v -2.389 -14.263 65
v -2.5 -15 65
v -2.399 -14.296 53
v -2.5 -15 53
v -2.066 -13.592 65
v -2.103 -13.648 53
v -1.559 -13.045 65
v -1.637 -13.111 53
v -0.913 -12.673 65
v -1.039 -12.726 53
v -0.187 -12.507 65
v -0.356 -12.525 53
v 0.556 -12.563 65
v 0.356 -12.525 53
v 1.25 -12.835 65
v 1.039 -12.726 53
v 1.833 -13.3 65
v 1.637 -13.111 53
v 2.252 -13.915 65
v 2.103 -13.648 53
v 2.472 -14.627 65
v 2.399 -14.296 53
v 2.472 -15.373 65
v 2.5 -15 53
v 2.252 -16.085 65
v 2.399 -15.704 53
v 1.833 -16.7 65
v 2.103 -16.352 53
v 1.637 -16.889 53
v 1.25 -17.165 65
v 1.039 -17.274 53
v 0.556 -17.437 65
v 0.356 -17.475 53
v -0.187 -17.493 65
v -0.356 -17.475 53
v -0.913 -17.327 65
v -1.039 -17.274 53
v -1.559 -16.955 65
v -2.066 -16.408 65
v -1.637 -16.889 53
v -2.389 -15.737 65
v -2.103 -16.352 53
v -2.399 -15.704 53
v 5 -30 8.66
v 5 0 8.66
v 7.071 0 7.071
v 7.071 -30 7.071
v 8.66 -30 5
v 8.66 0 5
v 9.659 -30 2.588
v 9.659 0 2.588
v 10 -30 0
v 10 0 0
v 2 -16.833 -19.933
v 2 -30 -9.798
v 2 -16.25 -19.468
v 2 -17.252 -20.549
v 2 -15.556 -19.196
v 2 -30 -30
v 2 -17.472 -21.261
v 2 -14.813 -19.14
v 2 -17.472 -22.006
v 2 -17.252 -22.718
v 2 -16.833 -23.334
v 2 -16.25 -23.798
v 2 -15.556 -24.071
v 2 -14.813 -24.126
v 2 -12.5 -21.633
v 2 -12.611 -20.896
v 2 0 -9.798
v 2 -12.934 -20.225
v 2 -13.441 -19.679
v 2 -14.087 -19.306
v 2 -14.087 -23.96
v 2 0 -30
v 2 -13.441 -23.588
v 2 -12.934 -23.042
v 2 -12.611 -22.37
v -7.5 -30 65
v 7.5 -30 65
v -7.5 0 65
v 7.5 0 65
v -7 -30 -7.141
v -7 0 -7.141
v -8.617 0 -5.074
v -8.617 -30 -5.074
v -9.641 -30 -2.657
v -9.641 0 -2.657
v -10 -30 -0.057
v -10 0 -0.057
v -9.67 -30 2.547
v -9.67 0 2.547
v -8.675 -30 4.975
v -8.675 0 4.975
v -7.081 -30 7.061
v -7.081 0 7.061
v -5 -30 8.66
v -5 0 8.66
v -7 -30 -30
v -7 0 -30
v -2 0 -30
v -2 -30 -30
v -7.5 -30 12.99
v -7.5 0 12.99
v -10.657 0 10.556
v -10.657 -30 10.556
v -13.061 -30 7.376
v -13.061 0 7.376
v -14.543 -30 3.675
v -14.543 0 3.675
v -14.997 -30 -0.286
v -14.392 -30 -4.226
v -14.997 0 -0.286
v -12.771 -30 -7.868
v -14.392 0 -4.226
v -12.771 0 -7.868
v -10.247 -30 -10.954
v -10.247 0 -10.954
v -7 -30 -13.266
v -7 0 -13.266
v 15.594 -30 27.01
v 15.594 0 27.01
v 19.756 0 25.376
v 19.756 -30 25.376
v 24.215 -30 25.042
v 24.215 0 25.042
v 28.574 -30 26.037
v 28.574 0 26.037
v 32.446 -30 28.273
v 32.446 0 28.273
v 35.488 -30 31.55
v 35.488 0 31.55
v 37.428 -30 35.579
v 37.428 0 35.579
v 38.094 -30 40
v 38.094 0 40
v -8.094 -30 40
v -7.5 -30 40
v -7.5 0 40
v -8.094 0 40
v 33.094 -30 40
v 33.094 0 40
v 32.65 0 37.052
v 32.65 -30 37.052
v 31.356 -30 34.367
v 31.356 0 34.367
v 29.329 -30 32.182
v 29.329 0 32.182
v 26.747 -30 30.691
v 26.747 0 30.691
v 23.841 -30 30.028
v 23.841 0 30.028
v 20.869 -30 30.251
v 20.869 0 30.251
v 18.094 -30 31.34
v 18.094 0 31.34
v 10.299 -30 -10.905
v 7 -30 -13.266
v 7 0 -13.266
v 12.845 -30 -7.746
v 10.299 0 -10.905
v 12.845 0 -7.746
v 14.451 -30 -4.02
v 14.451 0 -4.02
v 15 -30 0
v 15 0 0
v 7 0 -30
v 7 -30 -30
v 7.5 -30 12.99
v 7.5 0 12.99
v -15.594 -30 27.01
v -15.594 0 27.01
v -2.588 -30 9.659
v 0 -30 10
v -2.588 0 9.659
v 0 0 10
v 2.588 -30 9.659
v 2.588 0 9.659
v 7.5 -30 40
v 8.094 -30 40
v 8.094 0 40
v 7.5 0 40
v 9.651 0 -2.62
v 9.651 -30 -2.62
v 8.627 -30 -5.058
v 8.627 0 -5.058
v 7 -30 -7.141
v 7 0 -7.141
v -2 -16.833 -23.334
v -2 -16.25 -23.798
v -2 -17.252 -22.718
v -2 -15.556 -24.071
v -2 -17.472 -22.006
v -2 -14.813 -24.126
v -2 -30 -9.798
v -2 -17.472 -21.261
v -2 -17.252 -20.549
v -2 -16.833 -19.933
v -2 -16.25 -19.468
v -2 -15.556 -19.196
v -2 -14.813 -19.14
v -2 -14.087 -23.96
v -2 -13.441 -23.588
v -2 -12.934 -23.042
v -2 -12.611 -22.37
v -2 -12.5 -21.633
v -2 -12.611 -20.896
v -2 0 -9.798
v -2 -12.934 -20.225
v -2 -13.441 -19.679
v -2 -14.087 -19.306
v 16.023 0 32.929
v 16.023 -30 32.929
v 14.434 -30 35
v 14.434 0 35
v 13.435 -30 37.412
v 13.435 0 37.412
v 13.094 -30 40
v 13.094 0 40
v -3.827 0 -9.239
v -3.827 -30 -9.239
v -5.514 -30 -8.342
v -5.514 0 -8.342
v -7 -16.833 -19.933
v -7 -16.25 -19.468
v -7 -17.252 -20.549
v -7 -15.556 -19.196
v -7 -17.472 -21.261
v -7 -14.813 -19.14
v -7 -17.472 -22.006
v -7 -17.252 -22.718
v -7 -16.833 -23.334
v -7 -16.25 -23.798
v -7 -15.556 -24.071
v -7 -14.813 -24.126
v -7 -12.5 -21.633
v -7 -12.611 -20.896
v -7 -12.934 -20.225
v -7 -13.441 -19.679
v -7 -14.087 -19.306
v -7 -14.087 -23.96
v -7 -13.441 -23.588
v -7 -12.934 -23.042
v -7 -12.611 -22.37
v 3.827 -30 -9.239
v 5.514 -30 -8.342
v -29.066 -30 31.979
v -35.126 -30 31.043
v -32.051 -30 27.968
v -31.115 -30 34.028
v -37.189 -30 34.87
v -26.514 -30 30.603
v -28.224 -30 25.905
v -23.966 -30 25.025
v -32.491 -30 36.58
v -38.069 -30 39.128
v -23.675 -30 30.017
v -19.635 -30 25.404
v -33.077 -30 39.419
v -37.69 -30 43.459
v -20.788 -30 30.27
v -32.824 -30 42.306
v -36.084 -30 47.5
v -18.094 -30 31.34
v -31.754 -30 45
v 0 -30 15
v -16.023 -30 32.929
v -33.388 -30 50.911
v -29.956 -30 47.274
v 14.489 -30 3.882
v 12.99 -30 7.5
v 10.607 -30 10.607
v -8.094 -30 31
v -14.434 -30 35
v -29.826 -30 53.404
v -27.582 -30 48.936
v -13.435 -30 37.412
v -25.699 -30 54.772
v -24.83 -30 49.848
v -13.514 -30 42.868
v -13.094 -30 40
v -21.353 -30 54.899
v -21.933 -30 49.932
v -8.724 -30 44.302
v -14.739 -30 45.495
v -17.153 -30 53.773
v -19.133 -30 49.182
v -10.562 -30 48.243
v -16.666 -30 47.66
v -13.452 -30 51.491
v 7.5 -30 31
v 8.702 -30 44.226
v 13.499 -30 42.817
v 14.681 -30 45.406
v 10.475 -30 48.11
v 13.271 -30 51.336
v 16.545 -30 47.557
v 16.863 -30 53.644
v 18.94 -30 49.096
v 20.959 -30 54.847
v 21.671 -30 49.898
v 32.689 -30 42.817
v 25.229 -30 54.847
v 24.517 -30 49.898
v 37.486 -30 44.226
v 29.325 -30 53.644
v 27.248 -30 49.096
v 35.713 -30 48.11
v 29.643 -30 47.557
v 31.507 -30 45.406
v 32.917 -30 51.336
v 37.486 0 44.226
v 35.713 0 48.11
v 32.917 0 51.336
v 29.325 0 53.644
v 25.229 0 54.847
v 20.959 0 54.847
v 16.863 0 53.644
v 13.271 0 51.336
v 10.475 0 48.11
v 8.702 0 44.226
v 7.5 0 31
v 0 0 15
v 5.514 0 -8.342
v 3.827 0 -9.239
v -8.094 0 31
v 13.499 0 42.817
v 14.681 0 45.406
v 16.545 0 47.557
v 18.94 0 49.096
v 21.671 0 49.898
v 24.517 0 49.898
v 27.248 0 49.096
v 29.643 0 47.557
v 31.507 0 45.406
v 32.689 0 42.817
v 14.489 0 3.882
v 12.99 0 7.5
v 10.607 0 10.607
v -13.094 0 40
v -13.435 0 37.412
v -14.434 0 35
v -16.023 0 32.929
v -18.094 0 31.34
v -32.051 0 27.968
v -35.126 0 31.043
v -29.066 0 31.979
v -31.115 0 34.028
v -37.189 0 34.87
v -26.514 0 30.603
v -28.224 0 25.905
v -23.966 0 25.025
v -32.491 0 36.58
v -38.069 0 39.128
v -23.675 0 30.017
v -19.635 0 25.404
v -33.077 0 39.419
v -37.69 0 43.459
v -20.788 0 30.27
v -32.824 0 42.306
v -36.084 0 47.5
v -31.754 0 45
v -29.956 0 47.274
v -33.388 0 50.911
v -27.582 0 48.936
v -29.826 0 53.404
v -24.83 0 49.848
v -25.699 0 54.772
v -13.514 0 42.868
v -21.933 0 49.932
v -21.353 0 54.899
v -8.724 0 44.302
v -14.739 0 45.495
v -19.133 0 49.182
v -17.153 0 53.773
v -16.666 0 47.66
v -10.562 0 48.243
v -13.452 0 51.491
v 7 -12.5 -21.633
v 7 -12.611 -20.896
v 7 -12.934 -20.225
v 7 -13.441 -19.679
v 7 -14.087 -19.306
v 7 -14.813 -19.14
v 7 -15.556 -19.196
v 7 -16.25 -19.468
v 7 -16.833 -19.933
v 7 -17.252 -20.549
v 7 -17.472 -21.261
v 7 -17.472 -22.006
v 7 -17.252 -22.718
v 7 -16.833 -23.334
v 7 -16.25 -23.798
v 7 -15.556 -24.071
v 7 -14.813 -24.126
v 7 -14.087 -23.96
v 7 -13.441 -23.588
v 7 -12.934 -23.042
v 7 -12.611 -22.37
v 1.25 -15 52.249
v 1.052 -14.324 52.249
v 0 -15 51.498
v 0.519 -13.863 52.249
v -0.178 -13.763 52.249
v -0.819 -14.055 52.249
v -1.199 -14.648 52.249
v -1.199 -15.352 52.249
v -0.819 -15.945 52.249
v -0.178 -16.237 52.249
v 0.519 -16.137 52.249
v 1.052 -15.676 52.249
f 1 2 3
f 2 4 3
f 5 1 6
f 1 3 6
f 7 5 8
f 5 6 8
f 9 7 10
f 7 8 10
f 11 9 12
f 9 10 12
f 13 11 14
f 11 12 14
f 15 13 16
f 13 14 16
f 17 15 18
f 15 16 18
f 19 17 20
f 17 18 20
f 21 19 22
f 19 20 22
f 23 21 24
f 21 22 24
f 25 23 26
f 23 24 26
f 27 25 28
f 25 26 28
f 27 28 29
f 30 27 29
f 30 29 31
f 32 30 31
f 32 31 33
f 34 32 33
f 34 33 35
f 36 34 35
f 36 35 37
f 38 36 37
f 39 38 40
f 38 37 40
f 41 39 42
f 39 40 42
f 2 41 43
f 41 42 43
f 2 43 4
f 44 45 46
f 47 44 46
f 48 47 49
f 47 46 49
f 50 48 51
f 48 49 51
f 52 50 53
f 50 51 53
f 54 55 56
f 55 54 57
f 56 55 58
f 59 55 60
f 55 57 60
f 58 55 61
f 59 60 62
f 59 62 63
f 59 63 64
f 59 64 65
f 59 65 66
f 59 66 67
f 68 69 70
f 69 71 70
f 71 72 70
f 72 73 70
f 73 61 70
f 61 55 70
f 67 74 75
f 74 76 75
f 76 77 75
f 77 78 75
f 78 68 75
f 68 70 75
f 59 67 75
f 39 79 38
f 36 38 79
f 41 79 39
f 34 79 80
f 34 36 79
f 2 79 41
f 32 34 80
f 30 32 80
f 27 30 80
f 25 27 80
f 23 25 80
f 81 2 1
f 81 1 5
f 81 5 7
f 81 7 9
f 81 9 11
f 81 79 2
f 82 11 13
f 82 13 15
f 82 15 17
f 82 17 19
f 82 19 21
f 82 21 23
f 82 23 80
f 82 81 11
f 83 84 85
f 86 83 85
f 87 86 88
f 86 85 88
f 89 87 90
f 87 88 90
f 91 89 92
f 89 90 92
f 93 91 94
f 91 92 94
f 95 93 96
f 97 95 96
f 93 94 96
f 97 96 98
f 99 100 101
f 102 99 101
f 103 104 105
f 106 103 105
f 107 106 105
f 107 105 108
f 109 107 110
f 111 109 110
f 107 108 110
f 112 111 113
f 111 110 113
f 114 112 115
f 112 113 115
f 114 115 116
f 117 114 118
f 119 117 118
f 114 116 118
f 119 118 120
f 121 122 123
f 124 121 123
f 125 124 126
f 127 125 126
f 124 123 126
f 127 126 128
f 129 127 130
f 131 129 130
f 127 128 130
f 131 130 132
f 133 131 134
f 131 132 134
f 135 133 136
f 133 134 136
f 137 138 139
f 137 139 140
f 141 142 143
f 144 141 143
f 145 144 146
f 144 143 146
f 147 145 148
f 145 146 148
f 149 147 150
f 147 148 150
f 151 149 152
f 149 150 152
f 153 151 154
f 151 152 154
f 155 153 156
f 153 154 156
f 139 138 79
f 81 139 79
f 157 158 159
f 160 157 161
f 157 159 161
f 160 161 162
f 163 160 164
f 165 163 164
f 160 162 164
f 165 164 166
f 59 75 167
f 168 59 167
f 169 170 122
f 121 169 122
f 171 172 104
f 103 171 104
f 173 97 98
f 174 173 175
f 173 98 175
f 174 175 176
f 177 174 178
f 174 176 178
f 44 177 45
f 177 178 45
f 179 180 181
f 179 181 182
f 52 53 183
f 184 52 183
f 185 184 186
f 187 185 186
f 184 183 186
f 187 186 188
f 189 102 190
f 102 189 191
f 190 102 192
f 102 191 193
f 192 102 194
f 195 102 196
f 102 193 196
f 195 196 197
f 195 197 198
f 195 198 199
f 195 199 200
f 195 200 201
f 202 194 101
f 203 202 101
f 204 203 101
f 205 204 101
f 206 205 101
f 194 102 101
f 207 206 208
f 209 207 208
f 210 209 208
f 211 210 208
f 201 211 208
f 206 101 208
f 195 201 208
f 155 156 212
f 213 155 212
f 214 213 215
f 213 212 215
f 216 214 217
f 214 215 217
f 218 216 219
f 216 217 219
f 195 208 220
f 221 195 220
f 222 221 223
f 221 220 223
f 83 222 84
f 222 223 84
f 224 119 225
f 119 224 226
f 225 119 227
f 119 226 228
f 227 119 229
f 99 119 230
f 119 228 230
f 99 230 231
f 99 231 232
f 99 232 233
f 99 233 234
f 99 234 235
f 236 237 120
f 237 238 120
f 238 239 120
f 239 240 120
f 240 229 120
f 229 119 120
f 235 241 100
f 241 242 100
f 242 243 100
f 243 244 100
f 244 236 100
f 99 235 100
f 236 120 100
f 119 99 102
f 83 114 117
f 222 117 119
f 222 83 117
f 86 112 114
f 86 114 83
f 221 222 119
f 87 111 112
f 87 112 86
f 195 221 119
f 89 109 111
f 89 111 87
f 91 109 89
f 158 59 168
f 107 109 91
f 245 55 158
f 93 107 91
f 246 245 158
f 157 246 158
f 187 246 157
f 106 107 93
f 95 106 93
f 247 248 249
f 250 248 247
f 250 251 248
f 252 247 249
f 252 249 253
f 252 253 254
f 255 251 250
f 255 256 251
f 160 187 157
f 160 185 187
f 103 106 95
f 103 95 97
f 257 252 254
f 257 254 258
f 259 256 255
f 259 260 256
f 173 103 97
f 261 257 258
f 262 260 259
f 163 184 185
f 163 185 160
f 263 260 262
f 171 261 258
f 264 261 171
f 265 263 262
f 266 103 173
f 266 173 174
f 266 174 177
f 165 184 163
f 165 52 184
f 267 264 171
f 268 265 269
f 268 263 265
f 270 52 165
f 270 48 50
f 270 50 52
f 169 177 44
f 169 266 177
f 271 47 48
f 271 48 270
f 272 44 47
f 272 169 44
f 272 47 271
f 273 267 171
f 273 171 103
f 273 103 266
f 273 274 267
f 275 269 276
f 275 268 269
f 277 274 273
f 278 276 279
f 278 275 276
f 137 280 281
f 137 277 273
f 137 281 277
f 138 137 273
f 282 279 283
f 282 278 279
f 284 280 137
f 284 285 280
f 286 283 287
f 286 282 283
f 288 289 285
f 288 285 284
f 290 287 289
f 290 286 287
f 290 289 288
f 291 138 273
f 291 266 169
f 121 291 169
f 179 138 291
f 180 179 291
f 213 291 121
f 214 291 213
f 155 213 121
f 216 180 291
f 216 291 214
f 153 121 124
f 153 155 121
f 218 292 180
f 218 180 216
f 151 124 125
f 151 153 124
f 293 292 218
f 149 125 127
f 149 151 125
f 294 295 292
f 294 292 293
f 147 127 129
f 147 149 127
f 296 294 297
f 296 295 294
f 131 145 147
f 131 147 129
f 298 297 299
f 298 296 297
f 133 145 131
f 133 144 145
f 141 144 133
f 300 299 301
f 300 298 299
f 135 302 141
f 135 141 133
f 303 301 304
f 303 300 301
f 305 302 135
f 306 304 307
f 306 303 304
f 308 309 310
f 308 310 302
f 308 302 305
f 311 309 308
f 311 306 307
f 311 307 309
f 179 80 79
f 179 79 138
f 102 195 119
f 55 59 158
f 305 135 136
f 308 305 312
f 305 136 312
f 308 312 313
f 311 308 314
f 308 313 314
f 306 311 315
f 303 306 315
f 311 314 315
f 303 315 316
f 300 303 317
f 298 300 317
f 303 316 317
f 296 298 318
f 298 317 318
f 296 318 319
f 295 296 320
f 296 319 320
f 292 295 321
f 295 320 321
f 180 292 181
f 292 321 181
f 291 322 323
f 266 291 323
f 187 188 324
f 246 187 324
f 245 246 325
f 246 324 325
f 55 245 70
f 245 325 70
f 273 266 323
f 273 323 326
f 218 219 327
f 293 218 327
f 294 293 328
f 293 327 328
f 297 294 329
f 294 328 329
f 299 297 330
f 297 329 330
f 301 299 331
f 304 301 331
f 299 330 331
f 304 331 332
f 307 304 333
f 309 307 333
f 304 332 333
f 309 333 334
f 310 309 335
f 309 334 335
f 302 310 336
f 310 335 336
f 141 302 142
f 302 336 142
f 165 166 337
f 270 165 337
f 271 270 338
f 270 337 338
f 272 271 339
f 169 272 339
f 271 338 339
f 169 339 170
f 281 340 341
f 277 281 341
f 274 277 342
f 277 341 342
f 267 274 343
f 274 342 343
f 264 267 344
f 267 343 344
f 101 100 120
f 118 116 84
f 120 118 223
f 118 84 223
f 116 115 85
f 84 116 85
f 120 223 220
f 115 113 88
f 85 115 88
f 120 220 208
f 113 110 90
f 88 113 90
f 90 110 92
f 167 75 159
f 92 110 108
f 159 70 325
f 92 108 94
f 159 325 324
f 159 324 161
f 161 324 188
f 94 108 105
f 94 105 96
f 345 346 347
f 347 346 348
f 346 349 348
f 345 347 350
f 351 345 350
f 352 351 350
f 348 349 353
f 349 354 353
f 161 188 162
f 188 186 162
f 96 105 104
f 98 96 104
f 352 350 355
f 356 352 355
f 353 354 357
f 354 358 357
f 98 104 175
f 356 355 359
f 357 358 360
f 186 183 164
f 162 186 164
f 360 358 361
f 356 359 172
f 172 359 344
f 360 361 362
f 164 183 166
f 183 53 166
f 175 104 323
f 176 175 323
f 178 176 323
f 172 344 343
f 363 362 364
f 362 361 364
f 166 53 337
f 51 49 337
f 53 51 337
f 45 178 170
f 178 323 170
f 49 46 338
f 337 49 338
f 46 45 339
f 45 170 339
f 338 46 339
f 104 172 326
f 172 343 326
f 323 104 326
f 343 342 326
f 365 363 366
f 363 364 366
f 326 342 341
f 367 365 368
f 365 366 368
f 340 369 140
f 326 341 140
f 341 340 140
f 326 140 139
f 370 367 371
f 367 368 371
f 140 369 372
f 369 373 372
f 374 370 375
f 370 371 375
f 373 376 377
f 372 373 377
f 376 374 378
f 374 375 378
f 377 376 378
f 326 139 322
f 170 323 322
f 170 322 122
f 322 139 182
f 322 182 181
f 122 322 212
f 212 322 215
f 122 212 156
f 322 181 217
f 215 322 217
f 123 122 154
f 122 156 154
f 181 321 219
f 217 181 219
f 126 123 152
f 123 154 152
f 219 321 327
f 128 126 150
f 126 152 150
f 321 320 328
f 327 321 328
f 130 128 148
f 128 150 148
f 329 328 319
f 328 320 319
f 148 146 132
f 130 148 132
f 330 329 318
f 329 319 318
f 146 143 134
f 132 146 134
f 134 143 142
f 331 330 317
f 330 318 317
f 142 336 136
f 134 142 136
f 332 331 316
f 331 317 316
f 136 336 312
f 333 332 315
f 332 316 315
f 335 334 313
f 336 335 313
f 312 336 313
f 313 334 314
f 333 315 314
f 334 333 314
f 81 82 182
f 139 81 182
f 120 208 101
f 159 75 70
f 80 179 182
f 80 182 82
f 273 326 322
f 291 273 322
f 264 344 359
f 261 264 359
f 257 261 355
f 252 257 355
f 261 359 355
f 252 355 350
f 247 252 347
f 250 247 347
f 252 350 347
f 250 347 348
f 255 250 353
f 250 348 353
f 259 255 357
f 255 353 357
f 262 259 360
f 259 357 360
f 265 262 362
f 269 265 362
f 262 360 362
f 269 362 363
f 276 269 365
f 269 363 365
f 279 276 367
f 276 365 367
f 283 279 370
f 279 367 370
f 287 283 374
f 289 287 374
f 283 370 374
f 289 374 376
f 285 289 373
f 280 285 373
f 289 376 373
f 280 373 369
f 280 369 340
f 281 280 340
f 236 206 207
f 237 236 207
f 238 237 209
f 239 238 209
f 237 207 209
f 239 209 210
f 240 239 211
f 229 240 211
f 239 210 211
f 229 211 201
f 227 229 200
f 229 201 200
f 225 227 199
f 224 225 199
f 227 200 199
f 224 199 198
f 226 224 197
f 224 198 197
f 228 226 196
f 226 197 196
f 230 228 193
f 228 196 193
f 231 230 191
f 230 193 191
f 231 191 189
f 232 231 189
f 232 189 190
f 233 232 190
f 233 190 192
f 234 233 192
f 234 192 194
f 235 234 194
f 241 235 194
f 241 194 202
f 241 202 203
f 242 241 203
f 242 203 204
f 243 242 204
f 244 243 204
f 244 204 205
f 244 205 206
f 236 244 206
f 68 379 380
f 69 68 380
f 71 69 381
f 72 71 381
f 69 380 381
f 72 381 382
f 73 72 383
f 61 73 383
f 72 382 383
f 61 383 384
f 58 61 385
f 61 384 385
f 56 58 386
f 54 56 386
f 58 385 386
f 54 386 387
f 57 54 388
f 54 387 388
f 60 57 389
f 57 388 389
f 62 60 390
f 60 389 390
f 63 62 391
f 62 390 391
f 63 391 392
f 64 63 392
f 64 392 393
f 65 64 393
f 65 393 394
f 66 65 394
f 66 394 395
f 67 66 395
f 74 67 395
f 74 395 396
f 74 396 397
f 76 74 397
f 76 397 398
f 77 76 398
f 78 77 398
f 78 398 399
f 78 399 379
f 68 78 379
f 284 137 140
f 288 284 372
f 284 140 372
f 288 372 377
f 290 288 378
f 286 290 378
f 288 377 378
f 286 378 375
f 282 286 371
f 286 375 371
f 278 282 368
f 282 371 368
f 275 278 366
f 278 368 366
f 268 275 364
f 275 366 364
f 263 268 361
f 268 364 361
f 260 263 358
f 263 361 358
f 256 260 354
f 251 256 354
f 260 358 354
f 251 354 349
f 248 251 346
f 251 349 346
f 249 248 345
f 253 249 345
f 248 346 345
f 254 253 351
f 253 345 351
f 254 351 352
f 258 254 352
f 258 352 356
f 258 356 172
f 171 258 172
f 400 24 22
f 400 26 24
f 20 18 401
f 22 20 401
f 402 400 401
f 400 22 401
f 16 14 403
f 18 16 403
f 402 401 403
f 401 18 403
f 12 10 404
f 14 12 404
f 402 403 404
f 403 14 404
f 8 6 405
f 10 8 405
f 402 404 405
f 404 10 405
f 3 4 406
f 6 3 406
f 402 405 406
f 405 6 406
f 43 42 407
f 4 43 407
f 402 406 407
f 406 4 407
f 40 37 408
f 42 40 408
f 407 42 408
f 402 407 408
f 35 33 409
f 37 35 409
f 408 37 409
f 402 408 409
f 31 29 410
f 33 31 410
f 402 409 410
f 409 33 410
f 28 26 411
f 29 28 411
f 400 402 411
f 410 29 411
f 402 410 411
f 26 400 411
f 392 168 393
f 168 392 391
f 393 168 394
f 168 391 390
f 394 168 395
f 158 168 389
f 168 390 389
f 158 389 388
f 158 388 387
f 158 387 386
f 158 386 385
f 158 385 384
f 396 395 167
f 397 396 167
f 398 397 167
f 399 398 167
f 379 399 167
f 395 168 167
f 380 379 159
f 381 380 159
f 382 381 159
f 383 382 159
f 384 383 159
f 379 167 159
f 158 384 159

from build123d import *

# Parameters (mm, degrees)
F0_W     = 15
F0_H     = 25
F1_DEPTH = 30
F3_D     = 5
F3_DEPTH = 12
F3_TIP   = 1.5021515476
F4_R     = 2.5
F5_DEPTH = 25
F7_DEPTH = 40


with BuildPart() as f1:
    # F0 (on Front) → F1 (new body)
    with BuildSketch(Plane.XZ):
        with BuildLine():
            Line((18.0940107676, 31.3397459622), (15.5940107676, 27.0096189432))
            ThreePointArc((15.5940107676, 27.0096189432), (30.5940107676, 27.0096189432), (38.0940107676, 40))
            ThreePointArc((38.0940107676, 40), (23.0940107676, 55), (8.0940107676, 40))
            Line((8.0940107676, 40), (13.0940107676, 40))
            ThreePointArc((13.0940107676, 40), (23.0940107676, 50), (33.0940107676, 40))
            ThreePointArc((33.0940107676, 40), (28.0940107676, 31.3397459622), (18.0940107676, 31.3397459622))
        make_face()
        with BuildLine():
            ThreePointArc((-8.0940107676, 40), (-36.0843918244, 47.5), (-15.5940107676, 27.0096189432))
            Line((-15.5940107676, 27.0096189432), (-18.0940107676, 31.3397459622))
            ThreePointArc((-18.0940107676, 31.3397459622), (-31.7542648054, 45), (-13.0940107676, 40))
            Line((-13.0940107676, 40), (-8.0940107676, 40))
        make_face()
        with BuildLine():
            ThreePointArc((-2, -14.8660687473), (-4.5705202893, -14.2867191575), (-7, -13.2664991614))
            Line((-7, -13.2664991614), (-7, -30))
            Line((-7, -30), (-2, -30))
            Line((-2, -30), (-2, -14.8660687473))
        make_face()
        with BuildLine():
            Line((7, -30), (7, -13.2664991614))
            ThreePointArc((7, -13.2664991614), (4.5705202893, -14.2867191575), (2, -14.8660687473))
            Line((2, -14.8660687473), (2, -30))
            Line((2, -30), (7, -30))
        make_face()
        with BuildLine():
            ThreePointArc((-7, -7.1414284285), (-9.9208513844, 1.2556702624), (-5, 8.6602540378))
            Line((-5, 8.6602540378), (-7.5, 12.9903810568))
            ThreePointArc((-7.5, 12.9903810568), (-14.9972810769, -0.2855876432), (-7, -13.2664991614))
            Line((-7, -13.2664991614), (-7, -7.1414284285))
        make_face()
        with BuildLine():
            ThreePointArc((5, 8.6602540378), (8.6602540378, 5), (10, 0))
            ThreePointArc((10, 0), (9.2195444573, -3.8729833462), (7, -7.1414284285))
            Line((7, -7.1414284285), (7, -13.2664991614))
            ThreePointArc((7, -13.2664991614), (12.8452325787, -7.7459666924), (15, 0))
            ThreePointArc((15, 0), (12.9903810568, 7.5), (7.5, 12.9903810568))
            Line((7.5, 12.9903810568), (5, 8.6602540378))
        make_face()
        with BuildLine():
            ThreePointArc((8.0940107676, 40), (10.1036297108, 32.5), (15.5940107676, 27.0096189432))
            Line((15.5940107676, 27.0096189432), (18.0940107676, 31.3397459622))
            ThreePointArc((18.0940107676, 31.3397459622), (14.4337567297, 35), (13.0940107676, 40))
            Line((13.0940107676, 40), (8.0940107676, 40))
        make_face()
        with BuildLine():
            Line((-18.0940107676, 31.3397459622), (-15.5940107676, 27.0096189432))
            ThreePointArc((-15.5940107676, 27.0096189432), (-10.1036297108, 32.5), (-8.0940107676, 40))
            Line((-8.0940107676, 40), (-13.0940107676, 40))
            ThreePointArc((-13.0940107676, 40), (-14.4337567297, 35), (-18.0940107676, 31.3397459622))
        make_face()
        with BuildLine():
            Line((-15.5940107676, 27.0096189432), (-7.5, 12.9903810568))
            ThreePointArc((-7.5, 12.9903810568), (-3.8822856765, 14.4888873943), (0, 15))
            Line((0, 15), (-7.5, 15))
            Line((-7.5, 15), (-7.5, 40))
            Line((-7.5, 40), (-8.0940107676, 40))
            ThreePointArc((-8.0940107676, 40), (-10.1036297108, 32.5), (-15.5940107676, 27.0096189432))
        make_face()
        with BuildLine():
            ThreePointArc((-5, 8.6602540378), (0, 10), (5, 8.6602540378))
            Line((5, 8.6602540378), (7.5, 12.9903810568))
            ThreePointArc((7.5, 12.9903810568), (3.8822856765, 14.4888873943), (0, 15))
            ThreePointArc((0, 15), (-3.8822856765, 14.4888873943), (-7.5, 12.9903810568))
            Line((-7.5, 12.9903810568), (-5, 8.6602540378))
        make_face()
        with BuildLine():
            ThreePointArc((-2, -9.7979589711), (-4.6919386858, -8.8309518948), (-7, -7.1414284285))
            Line((-7, -7.1414284285), (-7, -13.2664991614))
            ThreePointArc((-7, -13.2664991614), (-4.5705202893, -14.2867191575), (-2, -14.8660687473))
            Line((-2, -14.8660687473), (-2, -9.7979589711))
        make_face()
        with BuildLine():
            Line((7, -13.2664991614), (7, -7.1414284285))
            ThreePointArc((7, -7.1414284285), (4.6919386858, -8.8309518948), (2, -9.7979589711))
            Line((2, -9.7979589711), (2, -14.8660687473))
            ThreePointArc((2, -14.8660687473), (4.5705202893, -14.2867191575), (7, -13.2664991614))
        make_face()
        Polygon((-7.5, 15), (0, 15), (7.5, 15), (7.5, 40), (-7.5, 40), align=None)
        with Locations((0, 52.5)):
            Rectangle(F0_W, F0_H)
        with BuildLine():
            ThreePointArc((0, 15), (3.8822856765, 14.4888873943), (7.5, 12.9903810568))
            Line((7.5, 12.9903810568), (15.5940107676, 27.0096189432))
            ThreePointArc((15.5940107676, 27.0096189432), (10.1036297108, 32.5), (8.0940107676, 40))
            Line((8.0940107676, 40), (7.5, 40))
            Line((7.5, 40), (7.5, 15))
            Line((7.5, 15), (0, 15))
        make_face()
    extrude(amount=F1_DEPTH)

    # F3
    with Locations(Plane.XY.offset(65)):
        with Locations((0, -15)):
            Hole(F3_D / 2, depth=F3_DEPTH)
            with Locations((0, 0, -(F3_DEPTH + F3_TIP / 2))):  # 118° drill point
                Cone(0, F3_D / 2, F3_TIP, mode=Mode.SUBTRACT)

    # F4 (on face) → F5 (cut)
    with BuildSketch(Plane.YZ.offset(7)):
        with Locations((-15, -21.6332495807)):
            Circle(F4_R)
    extrude(amount=-F5_DEPTH, mode=Mode.SUBTRACT)

    # F6 (on face) → F7 (cut)
    with BuildSketch(Plane(origin=(0, 0, 0), x_dir=(-1, 0, 0), z_dir=(0, 1, 0))):
        Polygon((-7.5, 31), (0, 15), (8.0940107676, 31), align=None)
    extrude(amount=-F7_DEPTH, mode=Mode.SUBTRACT)


solid = f1.part
